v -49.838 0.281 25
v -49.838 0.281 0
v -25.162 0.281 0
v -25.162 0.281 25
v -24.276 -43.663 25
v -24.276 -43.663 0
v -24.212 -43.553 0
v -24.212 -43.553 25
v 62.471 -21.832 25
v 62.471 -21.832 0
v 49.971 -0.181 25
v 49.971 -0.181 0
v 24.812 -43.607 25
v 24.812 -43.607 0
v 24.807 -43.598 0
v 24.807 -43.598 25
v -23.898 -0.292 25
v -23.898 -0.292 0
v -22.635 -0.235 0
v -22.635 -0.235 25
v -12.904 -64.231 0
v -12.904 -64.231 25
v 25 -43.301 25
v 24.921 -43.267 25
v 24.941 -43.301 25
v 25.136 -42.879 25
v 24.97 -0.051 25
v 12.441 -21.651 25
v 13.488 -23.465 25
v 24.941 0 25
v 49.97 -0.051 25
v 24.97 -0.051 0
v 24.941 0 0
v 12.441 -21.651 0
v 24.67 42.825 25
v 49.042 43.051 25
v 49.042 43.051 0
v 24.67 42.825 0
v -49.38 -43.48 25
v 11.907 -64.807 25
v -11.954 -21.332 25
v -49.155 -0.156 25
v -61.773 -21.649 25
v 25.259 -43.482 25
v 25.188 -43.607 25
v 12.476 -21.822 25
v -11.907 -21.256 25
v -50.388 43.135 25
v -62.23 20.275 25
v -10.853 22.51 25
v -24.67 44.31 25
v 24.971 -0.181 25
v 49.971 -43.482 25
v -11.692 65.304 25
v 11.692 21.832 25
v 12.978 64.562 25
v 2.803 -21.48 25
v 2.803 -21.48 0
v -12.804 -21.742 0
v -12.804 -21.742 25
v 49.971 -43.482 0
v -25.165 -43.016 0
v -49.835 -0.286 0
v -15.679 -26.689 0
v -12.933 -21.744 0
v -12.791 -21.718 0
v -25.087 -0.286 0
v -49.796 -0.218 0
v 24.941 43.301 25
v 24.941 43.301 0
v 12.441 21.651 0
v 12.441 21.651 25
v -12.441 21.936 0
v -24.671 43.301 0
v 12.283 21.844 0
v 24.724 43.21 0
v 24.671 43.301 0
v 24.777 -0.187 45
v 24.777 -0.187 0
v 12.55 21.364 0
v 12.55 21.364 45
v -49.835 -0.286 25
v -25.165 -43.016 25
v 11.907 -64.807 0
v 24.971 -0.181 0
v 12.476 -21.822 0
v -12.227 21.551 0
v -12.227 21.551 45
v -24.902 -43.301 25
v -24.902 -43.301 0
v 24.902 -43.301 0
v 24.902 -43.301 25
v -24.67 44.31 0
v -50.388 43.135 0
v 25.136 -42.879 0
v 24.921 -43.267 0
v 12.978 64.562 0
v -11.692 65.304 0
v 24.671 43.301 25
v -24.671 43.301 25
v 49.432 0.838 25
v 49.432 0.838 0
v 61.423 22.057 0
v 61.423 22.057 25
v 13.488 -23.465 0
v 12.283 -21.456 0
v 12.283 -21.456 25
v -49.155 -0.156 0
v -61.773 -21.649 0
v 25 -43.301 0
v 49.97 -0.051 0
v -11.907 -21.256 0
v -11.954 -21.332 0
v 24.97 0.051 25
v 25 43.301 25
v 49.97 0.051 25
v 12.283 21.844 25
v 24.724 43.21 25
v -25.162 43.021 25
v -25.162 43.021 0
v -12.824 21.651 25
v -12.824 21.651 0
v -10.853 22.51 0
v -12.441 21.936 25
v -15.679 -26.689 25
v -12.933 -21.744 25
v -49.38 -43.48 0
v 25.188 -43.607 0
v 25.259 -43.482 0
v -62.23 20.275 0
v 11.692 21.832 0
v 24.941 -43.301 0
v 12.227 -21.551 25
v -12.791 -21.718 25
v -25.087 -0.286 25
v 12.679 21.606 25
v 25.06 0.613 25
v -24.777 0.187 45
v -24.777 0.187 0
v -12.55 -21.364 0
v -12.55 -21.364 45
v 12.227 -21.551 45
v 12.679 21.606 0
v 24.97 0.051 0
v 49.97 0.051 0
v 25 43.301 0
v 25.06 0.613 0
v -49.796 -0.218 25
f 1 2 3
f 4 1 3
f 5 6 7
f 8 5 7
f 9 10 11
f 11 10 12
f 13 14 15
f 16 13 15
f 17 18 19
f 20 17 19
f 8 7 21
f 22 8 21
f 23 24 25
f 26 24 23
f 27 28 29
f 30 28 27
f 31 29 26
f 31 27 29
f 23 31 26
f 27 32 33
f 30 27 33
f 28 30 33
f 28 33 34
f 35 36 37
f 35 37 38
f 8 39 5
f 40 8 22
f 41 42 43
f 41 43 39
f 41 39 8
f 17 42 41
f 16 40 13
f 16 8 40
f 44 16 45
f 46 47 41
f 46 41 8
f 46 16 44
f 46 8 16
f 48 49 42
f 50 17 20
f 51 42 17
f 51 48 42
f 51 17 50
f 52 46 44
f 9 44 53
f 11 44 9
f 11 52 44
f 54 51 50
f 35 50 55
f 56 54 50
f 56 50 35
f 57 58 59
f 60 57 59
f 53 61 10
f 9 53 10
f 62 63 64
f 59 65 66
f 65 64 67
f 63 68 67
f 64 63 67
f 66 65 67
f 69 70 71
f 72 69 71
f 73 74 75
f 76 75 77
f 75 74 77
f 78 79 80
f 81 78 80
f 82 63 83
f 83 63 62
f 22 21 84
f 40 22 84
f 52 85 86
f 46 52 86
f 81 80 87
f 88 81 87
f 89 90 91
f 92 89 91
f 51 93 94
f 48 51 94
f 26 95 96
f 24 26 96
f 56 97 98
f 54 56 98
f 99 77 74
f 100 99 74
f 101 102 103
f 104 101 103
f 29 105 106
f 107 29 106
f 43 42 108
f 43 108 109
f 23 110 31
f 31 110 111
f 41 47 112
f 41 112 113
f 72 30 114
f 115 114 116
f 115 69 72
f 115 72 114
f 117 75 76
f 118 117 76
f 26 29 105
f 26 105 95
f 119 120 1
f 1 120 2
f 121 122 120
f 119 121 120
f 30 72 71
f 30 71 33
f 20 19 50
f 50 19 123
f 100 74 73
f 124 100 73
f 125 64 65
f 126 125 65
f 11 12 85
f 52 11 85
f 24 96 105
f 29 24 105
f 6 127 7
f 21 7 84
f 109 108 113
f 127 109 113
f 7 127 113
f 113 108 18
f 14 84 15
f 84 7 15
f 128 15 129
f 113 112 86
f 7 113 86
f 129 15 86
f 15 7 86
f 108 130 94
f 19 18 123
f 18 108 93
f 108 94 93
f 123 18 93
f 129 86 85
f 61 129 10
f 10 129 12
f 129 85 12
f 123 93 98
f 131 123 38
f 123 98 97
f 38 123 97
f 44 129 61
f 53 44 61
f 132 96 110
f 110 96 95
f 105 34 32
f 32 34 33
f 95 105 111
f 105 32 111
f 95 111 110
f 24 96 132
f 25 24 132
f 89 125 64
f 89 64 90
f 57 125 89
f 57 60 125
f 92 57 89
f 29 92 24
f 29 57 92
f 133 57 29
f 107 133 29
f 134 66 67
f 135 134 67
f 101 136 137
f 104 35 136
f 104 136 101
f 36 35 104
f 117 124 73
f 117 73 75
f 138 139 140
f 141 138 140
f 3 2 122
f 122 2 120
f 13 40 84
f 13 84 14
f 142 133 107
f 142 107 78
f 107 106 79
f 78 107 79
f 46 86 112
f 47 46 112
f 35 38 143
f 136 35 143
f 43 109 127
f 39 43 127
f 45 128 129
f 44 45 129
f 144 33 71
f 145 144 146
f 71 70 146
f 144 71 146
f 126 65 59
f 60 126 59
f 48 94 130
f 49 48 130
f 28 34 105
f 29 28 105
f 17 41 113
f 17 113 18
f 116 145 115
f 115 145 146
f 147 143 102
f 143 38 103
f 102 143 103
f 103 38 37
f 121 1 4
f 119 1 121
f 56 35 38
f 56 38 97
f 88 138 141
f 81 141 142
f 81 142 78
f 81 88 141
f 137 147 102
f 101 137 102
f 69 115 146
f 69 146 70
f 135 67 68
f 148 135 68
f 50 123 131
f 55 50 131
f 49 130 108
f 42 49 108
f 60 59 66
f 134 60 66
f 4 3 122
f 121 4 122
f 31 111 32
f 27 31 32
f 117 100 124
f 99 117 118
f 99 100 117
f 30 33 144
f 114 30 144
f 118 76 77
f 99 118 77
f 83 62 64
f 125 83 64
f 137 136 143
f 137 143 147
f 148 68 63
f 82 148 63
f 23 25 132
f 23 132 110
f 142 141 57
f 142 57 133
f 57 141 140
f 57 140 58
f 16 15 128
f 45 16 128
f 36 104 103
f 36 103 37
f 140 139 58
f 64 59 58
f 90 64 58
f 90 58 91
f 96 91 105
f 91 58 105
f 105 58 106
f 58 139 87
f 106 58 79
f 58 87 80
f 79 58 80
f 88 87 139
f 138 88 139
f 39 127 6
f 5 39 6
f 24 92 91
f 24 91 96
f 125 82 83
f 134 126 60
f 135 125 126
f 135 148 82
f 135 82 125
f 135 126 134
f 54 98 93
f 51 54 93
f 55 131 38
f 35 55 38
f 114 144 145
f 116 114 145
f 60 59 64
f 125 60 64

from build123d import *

# Parameters (mm, degrees)
F1_DEPTH = 25
F3_DEPTH = 45
F5_DEPTH = 25


with BuildPart() as f1:
    # F0 (on Top) → F1 (new body)
    with BuildSketch(Plane.XY):
        Polygon((-24.9015906488, -43.3012701892), (24.9015906488, -43.3012701892), (24.920755634, -43.2667499076), (13.4884686604, -23.4654480227), (12.2024788915, -21.3219676951), (-12.8043784561, -21.7417962361), (-15.6788632745, -26.6891443595), align=None)
    extrude(amount=F1_DEPTH)

    # F2 (on Top) → F3 (join)
    with BuildSketch(Plane.XY):
        Polygon((24.7769024833, -0.186750258), (12.5501817092, 21.3640518486), (-12.2267207741, 21.5508021066), (-24.7769024833, 0.186750258), (-12.5501817092, -21.3640518486), (12.2267207741, -21.5508021066), align=None)
    extrude(amount=F3_DEPTH)


with BuildPart() as f1b:
    # F0 (on Top) → F1, piece 2 (new body)
    with BuildSketch(Plane.XY):
        Polygon((-25.1648577894, -43.0157281219), (-15.6788632745, -26.6891443595), (-12.9333948717, -21.7439622329), (-12.8043784561, -21.7417962361), (-12.7908121471, -21.7184469206), (-25.0866793096, -0.2857566201), (-49.7958671625, -0.2179447942), (-49.8351422106, -0.2855420673), align=None)
    extrude(amount=F1_DEPTH)


with BuildPart() as f1c:
    # F0 (on Top) → F1, piece 3 (new body)
    with BuildSketch(Plane.XY):
        Polygon((-12.8239028156, 21.6506350946), (-25.1619514078, 43.0207621226), (-49.8380485922, 0.2805080666), (-25.1619514078, 0.2805080666), align=None)
    extrude(amount=F1_DEPTH)


with BuildPart() as f1d:
    # F0 (on Top) → F1, piece 4 (new body)
    with BuildSketch(Plane.XY):
        Polygon((24.7235831244, 43.2101708227), (24.6714334975, 43.3012701892), (-24.6714334975, 43.3012701892), (-12.4406859279, 21.9355688142), (12.2828971965, 21.8444694476), align=None)
    extrude(amount=F1_DEPTH)


with BuildPart() as f1e:
    # F0 (on Top) → F1, piece 5 (new body)
    with BuildSketch(Plane.XY):
        Polygon((24.9703429639, 0.0513674933), (49.9703429639, 0.0513674933), (25, 43.3012701892), (24.9406859279, 43.3012701892), (12.4406859279, 21.6506350946), (24.9406859279, 0), align=None)
    extrude(amount=F1_DEPTH)


with BuildPart() as f1f:
    # F0 (on Top) → F1, piece 6 (new body)
    with BuildSketch(Plane.XY):
        Polygon((25, -43.3012701892), (49.9703429639, -0.0513674933), (24.9703429639, -0.0513674933), (24.9406859279, 0), (12.4406859279, -21.6506350946), (13.4884686604, -23.4654480227), (25.1358737632, -42.8792756513), (24.920755634, -43.2667499076), (24.9406859279, -43.3012701892), align=None)
    extrude(amount=F1_DEPTH)


with BuildPart() as f5:
    # F4 (on Top) → F5 (new body)
    with BuildSketch(Plane.XY):
        Polygon((49.041816591, 43.050640718), (24.6702112422, 42.8253904077), (12.6794810587, 21.6063358895), (25.0603562239, 0.6125316815), (49.4319615728, 0.8377819918), (61.4226917563, 22.05683651), align=None)
    extrude(amount=F5_DEPTH)


with BuildPart() as f5b:
    # F4 (on Top) → F5, piece 2 (new body)
    with BuildSketch(Plane.XY):
        Polygon((12.978086952, 64.5616455046), (-11.6921242902, 65.3040963936), (-24.6702112422, 44.3102921857), (-10.7934787484, 22.6254111641), (-10.8532145767, 22.5100889787), (11.6921242902, 21.8315861997), (24.6702112422, 42.8253904077), align=None)
        Polygon((-10.7934787484, 22.6254111641), (-24.6702112422, 44.3102921857), (-12.978086952, 22.5740370887), (-10.8532145767, 22.5100889787), align=None)
        Polygon((-12.978086952, 22.5740370887), (-24.6702112422, 44.3102921857), (-50.3882353318, 43.1351298353), (-62.2295269276, 20.2750864634), (-49.154966171, -0.1562574819), (-49.0632279674, 0), (-23.9597777086, -0.182724813), (-23.8975541406, -0.2923339958), (-22.6347703442, -0.2346322078), (-10.8532145767, 22.5100889787), align=None)
        Polygon((-48.3527944338, -1.4097945581), (-49.154966171, -0.1562574819), (-61.7731974268, -21.6488632403), (-49.3797166273, -43.4804512936), (-24.2762663685, -43.6631761066), (-24.2116136144, -43.5530532117), (-24.811594837, -42.4558632819), (-11.9536265425, -21.3320169775), (-23.8975541406, -0.2923339958), align=None)
        Polygon((-49.0632279674, 0), (-49.154966171, -0.1562574819), (-48.3527944338, -1.4097945581), (-23.8975541406, -0.2923339958), (-23.9597777086, -0.182724813), align=None)
        Polygon((-11.5662969091, -22.0143128663), (-11.9536265425, -21.3320169775), (-24.811594837, -42.4558632819), (-23.5840465975, -42.4841196815), align=None)
        Polygon((-11.9074308551, -21.2561239142), (-11.9536265425, -21.3320169775), (-11.5662969091, -22.0143128663), (-23.5840465975, -42.4841196815), (24.8067913325, -43.5980073572), (20.6762670877, -36.0444882887), (12.4704453108, -21.8315880533), (12.4761763604, -21.8216615842), align=None)
        Polygon((-23.5840465975, -42.4841196815), (-24.811594837, -42.4558632819), (-24.2116136144, -43.5530532117), align=None)
        Polygon((-23.5840465975, -42.4841196815), (-24.2116136144, -43.5530532117), (-12.904163982, -64.2310667888), (11.9074308551, -64.8065309279), (24.811594837, -43.6067915601), (24.8067913325, -43.5980073572), align=None)
        Polygon((24.9706025286, -0.1806806495), (12.4761763604, -21.8216615842), (12.904163982, -21.8315880533), (20.6762670877, -36.0444882887), (24.9706025286, -43.4824954571), (25.2593387459, -43.4824954571), (49.9709169642, -0.1806806495), align=None)
        Polygon((12.904163982, -21.8315880533), (12.4761763604, -21.8216615842), (12.4704453108, -21.8315880533), (20.6762670877, -36.0444882887), align=None)
        Polygon((20.6762670877, -36.0444882887), (24.8067913325, -43.5980073572), (25.188405163, -43.6067915601), (25.2593387459, -43.4824954571), (24.9706025286, -43.4824954571), align=None)
        Polygon((62.4710741819, -21.8315880533), (49.9709169642, -0.1806806495), (25.2593387459, -43.4824954571), (49.9709169642, -43.4824954571), align=None)
    extrude(amount=F5_DEPTH)


solid = Compound([f1.part, f1b.part, f1c.part, f1d.part, f1e.part, f1f.part, f5.part, f5b.part])
